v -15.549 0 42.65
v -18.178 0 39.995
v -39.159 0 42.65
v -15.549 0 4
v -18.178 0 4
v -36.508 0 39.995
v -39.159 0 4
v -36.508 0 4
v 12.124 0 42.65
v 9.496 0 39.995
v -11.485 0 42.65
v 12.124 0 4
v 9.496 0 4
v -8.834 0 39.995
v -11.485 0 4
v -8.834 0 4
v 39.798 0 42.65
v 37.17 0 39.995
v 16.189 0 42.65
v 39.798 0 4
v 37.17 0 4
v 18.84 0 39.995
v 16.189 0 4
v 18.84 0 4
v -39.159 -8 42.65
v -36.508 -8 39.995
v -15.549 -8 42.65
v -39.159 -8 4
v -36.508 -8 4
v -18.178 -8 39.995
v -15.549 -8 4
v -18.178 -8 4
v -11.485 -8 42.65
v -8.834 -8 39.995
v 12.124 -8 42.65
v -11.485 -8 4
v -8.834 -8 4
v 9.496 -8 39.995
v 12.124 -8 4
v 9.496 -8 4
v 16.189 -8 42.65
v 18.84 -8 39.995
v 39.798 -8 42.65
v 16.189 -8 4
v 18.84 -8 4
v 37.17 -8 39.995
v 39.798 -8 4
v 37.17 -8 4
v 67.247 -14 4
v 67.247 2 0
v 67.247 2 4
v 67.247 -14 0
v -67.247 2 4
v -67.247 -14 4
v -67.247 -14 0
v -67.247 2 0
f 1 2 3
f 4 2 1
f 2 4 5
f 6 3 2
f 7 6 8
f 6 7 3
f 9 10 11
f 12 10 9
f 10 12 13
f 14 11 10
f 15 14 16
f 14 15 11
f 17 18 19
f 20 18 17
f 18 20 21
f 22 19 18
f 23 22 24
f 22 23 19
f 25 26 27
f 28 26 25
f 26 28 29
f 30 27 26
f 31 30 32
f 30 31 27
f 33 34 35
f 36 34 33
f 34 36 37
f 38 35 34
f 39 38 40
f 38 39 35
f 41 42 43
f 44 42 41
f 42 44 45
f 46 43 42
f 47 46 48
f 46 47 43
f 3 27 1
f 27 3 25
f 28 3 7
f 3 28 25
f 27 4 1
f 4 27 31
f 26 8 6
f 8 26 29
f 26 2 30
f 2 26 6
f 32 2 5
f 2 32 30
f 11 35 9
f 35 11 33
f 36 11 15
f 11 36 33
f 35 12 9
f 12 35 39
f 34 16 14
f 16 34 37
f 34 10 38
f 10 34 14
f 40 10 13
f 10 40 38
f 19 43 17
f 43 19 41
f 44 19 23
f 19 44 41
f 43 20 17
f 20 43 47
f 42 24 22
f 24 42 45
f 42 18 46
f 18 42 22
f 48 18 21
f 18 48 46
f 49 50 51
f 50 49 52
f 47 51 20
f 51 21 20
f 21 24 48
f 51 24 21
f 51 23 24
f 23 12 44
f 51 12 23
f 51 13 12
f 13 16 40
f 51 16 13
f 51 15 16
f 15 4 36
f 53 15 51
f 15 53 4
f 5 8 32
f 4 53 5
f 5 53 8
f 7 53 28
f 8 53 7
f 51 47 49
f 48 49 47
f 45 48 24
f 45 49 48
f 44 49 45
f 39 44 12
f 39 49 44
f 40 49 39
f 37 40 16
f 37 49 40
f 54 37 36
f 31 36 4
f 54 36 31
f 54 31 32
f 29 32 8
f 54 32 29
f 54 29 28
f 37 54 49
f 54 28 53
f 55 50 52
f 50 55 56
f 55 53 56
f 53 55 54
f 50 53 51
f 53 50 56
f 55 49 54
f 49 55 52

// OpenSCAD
// 由 scripts/make_text3d.py 生成 —— 改完可直接 scad_build.py 重编译
// 文字只在这里写一遍；底板尺寸是脚本量出文字包围盒后算好的明确数字
// 模式：立式（能放桌面）+底脚
text_str  = "苗白菜";
font_name = "Hiragino Sans GB";
size_mm   = 34.0;
height_mm = 8.0;
base_mm   = 0.0;
pad_mm    = 4.0;
hole_mm   = 0.0;
base_w    = 134.4950;
base_h    = 43.0668;

difference() {
  union() {
  translate([0, 0, 21.5334])
    rotate([90, 0, 0])
      union() {
  translate([0, 0, 0])
    linear_extrude(8.0)
      text(text_str, size = size_mm, font = font_name, halign = "center", valign = "center");
      }
  translate([0, -6.0000, 2.0000])
    cube([134.4950, 16.0000, 4.0000], center = true);
  }
}
